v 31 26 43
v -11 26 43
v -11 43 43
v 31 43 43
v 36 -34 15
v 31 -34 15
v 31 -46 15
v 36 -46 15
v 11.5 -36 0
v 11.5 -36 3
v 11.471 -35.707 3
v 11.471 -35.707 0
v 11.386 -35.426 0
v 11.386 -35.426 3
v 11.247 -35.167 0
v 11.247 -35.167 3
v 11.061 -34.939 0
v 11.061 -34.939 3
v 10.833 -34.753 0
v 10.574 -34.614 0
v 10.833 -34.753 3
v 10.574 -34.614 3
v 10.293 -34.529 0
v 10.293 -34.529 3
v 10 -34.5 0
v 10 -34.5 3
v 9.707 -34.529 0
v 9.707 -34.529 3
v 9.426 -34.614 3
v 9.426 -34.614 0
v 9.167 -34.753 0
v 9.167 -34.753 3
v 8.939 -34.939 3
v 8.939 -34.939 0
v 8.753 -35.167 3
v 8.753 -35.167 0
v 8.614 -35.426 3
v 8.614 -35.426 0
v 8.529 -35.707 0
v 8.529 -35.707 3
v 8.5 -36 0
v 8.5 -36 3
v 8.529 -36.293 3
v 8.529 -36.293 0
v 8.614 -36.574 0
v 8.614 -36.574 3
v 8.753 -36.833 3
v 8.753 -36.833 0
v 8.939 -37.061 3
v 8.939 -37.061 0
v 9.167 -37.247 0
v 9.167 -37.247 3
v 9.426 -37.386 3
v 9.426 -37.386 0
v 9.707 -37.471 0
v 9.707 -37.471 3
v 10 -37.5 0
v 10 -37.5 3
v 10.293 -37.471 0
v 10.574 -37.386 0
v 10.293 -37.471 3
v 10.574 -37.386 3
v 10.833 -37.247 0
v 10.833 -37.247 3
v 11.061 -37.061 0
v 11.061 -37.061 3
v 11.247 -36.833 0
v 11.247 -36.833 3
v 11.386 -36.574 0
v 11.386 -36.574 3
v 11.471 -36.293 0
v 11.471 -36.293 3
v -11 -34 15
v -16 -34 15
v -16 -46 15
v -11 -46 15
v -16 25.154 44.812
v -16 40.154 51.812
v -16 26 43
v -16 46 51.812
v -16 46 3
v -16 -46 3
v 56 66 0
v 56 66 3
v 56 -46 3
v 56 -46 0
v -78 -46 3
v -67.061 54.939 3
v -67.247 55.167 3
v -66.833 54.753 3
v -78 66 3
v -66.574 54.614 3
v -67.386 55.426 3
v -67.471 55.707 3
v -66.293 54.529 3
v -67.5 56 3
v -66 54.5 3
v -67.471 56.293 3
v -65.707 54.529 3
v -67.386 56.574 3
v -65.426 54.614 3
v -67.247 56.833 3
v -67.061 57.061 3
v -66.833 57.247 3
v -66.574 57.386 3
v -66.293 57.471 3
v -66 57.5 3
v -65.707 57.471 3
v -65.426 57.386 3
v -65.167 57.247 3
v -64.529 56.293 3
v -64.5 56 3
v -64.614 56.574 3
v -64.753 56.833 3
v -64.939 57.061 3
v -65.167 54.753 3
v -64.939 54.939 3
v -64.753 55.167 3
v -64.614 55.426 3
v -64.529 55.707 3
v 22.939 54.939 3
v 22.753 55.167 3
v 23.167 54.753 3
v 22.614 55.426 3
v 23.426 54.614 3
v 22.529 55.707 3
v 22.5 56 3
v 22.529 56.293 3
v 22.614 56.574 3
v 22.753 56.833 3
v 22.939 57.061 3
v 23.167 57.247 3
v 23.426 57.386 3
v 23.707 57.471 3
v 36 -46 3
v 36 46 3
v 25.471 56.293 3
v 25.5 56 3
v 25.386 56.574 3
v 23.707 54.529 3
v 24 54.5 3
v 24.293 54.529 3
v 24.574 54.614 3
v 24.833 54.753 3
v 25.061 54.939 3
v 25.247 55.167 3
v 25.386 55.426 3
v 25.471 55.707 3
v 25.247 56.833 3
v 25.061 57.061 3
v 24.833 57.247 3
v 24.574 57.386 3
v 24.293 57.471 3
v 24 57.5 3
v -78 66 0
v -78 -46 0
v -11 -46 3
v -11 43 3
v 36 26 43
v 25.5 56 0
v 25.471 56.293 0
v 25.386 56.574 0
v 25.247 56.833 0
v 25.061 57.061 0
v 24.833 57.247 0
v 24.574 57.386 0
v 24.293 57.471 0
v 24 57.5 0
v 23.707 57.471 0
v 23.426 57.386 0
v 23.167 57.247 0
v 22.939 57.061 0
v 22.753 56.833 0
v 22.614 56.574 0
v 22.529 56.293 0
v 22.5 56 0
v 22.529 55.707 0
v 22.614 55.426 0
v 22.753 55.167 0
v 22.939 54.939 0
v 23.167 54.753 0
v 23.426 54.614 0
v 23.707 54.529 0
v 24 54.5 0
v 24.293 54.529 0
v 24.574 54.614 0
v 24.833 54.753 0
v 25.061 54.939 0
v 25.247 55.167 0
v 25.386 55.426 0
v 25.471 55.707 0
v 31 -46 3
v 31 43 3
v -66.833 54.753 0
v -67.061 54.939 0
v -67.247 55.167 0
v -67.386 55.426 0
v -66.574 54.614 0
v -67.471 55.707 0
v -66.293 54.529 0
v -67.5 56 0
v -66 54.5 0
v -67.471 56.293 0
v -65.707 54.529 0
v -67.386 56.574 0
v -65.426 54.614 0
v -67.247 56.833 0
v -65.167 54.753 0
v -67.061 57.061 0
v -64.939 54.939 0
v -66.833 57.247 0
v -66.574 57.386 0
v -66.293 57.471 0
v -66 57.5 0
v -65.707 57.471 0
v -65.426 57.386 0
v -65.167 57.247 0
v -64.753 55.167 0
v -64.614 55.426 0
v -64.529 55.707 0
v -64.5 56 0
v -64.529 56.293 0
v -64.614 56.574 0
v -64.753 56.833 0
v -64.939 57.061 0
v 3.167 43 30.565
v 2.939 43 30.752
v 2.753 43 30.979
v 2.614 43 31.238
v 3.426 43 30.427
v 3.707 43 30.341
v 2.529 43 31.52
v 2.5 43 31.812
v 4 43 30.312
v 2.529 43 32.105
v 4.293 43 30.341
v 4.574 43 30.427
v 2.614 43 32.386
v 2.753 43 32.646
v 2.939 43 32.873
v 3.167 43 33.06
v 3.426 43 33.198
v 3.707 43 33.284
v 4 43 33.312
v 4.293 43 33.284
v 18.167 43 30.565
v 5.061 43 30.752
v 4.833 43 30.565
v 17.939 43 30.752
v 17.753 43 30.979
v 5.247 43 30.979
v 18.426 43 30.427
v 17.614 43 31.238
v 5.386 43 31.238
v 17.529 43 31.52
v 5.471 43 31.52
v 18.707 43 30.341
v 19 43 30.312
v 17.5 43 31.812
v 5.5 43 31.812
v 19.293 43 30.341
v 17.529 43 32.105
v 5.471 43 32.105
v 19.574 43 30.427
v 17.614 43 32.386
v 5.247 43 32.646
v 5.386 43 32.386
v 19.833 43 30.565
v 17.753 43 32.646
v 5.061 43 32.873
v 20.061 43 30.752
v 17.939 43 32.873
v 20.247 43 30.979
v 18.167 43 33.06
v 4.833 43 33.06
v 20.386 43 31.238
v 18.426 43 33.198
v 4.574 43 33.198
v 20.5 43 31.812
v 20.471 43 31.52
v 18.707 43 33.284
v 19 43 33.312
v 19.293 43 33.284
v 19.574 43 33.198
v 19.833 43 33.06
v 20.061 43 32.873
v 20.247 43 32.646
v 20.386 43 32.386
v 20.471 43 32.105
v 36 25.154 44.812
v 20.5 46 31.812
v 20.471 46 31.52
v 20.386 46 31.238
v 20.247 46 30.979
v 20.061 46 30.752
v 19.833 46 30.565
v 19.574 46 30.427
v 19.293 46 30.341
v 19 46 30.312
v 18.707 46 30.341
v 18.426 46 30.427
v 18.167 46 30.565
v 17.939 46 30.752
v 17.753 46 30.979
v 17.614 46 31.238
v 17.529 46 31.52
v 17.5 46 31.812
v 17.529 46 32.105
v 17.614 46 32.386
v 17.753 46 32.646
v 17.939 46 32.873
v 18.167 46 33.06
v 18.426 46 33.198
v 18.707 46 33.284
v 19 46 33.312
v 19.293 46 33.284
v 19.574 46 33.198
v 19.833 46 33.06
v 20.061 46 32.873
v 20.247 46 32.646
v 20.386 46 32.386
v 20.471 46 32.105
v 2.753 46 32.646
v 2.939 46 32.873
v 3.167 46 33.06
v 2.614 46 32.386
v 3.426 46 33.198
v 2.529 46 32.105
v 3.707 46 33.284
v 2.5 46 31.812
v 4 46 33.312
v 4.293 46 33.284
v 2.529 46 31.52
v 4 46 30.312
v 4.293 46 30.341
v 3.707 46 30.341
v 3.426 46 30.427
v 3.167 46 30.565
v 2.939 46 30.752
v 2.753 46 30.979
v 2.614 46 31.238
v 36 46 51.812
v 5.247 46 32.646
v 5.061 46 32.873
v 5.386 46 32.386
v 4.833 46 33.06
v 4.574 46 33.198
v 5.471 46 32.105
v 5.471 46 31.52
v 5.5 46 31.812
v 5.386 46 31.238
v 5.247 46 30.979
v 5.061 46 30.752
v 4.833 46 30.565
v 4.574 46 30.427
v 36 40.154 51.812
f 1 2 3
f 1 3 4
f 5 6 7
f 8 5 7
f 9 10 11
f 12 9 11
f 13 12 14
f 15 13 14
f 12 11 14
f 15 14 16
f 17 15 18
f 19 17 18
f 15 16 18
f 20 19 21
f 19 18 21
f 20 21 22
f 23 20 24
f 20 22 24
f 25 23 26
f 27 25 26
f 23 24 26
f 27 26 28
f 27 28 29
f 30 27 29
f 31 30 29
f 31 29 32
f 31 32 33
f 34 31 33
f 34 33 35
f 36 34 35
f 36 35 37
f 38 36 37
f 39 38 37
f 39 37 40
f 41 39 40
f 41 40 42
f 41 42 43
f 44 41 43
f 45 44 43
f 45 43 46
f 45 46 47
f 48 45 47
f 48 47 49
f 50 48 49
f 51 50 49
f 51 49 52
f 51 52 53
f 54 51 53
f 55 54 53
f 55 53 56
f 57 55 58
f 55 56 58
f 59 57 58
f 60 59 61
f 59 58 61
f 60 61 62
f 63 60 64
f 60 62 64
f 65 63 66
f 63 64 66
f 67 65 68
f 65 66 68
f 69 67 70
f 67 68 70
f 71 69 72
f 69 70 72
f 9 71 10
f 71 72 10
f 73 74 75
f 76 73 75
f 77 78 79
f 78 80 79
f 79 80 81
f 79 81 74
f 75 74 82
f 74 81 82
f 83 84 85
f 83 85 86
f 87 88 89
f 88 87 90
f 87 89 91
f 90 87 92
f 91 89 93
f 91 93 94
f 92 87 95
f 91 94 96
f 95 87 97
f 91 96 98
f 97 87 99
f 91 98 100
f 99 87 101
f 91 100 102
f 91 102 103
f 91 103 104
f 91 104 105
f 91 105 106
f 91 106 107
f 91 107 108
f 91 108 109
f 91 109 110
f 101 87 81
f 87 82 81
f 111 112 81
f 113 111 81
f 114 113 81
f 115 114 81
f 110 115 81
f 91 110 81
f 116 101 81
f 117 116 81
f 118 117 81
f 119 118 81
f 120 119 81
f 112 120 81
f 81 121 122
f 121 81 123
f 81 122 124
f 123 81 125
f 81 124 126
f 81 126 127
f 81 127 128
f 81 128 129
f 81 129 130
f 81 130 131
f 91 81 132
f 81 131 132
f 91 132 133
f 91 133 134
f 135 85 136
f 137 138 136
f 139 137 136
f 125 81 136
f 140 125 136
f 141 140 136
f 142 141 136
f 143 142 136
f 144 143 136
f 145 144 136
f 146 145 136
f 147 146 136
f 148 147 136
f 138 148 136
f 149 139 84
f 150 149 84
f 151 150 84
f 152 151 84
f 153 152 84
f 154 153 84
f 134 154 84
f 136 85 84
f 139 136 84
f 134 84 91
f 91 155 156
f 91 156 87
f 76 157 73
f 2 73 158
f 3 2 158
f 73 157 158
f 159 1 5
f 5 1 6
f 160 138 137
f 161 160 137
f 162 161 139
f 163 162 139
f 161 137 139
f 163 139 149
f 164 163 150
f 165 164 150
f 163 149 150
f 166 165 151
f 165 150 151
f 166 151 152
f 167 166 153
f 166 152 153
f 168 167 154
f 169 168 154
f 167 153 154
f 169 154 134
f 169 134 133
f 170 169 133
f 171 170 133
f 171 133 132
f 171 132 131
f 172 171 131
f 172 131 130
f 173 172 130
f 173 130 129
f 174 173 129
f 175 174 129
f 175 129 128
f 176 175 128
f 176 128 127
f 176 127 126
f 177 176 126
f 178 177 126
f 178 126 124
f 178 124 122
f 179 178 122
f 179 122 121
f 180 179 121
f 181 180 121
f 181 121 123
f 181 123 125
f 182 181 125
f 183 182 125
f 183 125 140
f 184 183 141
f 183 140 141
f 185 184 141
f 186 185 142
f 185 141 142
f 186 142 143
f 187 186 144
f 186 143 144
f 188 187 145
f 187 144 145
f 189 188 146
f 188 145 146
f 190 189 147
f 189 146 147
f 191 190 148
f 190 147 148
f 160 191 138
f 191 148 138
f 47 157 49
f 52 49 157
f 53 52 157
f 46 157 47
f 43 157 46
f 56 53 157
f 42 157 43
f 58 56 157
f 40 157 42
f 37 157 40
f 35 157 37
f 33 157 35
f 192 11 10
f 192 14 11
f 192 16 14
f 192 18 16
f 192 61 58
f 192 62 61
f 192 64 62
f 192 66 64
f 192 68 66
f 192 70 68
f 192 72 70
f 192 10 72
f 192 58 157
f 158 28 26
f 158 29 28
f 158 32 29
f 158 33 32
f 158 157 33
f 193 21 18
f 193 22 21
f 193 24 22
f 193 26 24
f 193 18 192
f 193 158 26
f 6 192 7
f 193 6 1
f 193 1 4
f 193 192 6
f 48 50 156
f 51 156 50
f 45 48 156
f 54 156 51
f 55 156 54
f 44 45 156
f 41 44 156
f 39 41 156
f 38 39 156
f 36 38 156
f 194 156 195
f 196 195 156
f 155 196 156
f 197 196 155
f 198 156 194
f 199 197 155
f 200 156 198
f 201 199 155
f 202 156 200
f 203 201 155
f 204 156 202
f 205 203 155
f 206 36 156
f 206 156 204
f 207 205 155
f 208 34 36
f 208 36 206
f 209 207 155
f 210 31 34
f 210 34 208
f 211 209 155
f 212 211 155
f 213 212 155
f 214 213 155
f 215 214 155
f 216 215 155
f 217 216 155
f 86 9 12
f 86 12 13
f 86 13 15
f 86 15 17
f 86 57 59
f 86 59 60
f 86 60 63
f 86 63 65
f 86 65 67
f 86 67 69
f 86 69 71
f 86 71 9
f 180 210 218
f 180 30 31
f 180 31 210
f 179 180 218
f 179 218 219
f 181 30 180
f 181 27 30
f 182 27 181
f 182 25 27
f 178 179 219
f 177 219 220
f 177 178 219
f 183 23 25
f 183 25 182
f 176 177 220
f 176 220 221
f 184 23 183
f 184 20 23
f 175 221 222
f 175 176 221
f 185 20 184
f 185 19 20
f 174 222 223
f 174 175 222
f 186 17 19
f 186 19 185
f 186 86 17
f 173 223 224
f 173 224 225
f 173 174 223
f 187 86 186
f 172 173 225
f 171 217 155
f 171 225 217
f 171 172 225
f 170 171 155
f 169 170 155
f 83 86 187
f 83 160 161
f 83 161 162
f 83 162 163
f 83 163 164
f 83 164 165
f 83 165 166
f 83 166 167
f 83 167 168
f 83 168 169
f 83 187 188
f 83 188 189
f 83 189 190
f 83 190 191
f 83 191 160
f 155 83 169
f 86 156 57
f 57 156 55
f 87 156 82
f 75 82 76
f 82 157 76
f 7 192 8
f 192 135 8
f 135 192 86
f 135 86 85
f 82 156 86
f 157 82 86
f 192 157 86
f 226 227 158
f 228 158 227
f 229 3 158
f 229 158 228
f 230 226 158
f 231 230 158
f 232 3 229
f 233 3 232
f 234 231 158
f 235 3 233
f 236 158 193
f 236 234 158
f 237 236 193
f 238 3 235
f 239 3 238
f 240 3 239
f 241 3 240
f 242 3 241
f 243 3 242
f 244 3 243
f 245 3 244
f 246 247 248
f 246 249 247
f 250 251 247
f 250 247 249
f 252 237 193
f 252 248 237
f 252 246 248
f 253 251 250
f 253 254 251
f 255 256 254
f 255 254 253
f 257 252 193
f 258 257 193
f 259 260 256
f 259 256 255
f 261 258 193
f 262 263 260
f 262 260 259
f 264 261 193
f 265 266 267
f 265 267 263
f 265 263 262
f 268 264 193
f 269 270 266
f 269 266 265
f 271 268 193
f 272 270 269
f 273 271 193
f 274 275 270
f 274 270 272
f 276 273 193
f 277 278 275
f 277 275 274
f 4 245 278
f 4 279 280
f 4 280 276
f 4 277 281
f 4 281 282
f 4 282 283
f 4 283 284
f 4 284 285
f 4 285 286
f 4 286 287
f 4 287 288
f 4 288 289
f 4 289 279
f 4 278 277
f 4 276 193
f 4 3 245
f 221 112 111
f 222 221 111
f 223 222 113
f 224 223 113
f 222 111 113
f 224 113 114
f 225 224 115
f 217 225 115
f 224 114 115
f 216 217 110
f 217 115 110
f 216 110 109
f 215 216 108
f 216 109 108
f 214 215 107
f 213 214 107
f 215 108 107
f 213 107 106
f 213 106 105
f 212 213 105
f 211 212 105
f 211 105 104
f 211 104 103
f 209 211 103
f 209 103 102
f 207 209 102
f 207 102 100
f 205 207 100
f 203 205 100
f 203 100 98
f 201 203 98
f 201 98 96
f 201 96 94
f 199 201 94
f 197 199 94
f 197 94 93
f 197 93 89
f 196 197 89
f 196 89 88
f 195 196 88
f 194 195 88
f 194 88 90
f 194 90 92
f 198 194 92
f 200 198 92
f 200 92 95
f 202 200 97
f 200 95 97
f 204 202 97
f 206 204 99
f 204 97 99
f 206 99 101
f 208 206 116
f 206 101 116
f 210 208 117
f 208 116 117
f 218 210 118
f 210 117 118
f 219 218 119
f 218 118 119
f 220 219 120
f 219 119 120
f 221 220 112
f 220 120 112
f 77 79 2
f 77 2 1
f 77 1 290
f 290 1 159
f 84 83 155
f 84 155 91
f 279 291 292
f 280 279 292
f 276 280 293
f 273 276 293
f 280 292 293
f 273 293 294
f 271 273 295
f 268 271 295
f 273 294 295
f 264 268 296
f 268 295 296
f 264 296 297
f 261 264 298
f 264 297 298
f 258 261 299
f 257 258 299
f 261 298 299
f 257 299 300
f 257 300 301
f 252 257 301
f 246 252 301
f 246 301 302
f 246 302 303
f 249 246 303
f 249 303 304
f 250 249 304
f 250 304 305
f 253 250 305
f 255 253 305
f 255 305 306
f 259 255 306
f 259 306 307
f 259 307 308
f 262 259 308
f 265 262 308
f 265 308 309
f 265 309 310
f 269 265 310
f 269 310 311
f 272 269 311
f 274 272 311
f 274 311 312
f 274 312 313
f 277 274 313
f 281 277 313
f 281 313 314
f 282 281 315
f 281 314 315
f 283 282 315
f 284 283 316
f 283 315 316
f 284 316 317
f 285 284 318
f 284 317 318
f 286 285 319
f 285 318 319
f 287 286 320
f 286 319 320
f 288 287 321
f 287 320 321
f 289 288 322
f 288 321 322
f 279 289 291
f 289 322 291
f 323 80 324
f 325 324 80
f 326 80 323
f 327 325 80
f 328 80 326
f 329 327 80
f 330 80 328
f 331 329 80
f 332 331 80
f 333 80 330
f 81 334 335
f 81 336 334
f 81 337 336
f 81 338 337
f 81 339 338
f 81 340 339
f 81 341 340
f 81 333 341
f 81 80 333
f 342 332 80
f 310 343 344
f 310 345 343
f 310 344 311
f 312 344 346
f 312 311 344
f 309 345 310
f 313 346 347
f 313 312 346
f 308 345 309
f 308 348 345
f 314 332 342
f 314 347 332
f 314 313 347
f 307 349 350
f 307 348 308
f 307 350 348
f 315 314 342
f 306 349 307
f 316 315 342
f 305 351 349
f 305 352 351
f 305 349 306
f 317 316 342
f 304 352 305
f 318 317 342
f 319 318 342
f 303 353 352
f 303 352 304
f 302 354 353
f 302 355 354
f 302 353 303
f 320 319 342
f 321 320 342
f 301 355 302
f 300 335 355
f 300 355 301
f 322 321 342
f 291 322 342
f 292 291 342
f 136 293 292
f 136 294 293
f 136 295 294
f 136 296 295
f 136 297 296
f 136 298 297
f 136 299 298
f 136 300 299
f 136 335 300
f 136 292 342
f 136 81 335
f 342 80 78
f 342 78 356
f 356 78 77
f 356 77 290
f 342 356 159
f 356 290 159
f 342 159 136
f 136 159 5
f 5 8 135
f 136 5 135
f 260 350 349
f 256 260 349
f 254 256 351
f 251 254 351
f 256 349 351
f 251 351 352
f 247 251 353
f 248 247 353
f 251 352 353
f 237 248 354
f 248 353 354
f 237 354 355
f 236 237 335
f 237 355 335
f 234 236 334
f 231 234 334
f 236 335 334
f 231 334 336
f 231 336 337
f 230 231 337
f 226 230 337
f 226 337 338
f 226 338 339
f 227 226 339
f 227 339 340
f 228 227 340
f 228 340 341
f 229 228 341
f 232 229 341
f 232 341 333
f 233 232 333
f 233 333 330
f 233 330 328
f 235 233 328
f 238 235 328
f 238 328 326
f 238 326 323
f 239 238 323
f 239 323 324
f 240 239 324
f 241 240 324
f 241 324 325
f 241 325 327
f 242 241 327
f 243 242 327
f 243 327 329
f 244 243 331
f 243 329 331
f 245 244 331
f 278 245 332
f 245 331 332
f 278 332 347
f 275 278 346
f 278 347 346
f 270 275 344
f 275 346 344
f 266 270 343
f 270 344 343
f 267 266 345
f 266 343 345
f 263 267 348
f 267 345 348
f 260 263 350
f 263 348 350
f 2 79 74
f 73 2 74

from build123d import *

# Parameters (mm, degrees)
SKETCH1_W           = 72
SKETCH1_H           = 92
BOSS_EXTRUDE1_DEPTH = 3
SKETCH2_W           = 5
SKETCH2_H           = 92
BOSS_EXTRUDE2_DEPTH = 47
BOSS_EXTRUDE3_REACH = 52
SKETCH3_W           = 52
SKETCH3_H           = 20
CUT_EXTRUDE3_REACH  = 54
SKETCH8_W           = 52
SKETCH8_H           = 16.552945357
BOSS_EXTRUDE5_DEPTH = 2
SKETCH9_W           = 52
SKETCH9_H           = 5
SKETCH9_H_2         = 0.845770931
BOSS_EXTRUDE6_DEPTH = 1.812366
SKETCH10_W          = 42
SKETCH10_H          = 40
CUT_EXTRUDE4_DEPTH  = 17
CUT_EXTRUDE5_REACH  = 94
SKETCH12_R          = 1.5
SKETCH13_W          = 72
SKETCH13_H          = 3
BOSS_EXTRUDE7_DEPTH = 20
SKETCH15_W          = 3
SKETCH15_H          = 112
BOSS_EXTRUDE8_DEPTH = 20
SKETCH16_W          = 3
SKETCH16_H          = 112
BOSS_EXTRUDE9_DEPTH = 42
CUT_EXTRUDE9_REACH  = 5
SKETCH14_R          = 1.5


with BuildPart() as part:
    # Sketch1 → Boss-Extrude1 (new body)
    with BuildSketch(Plane.XY):
        Rectangle(SKETCH1_W, SKETCH1_H)
    extrude(amount=BOSS_EXTRUDE1_DEPTH)

    # Sketch2 → Boss-Extrude2 (add)
    with BuildSketch(Plane.XY.offset(3)):
        with Locations((33.5, 0)):
            Rectangle(SKETCH2_W, SKETCH2_H)
        with Locations((-13.5, 0)):
            Rectangle(SKETCH2_W, SKETCH2_H)
    extrude(amount=BOSS_EXTRUDE2_DEPTH)

    # Sketch3 → Boss-Extrude3 (add, up to next)
    with BuildSketch(Plane.XY.offset(50), mode=Mode.PRIVATE) as boss_extrude3_sk1:
        with Locations((10, 36)):
            Rectangle(SKETCH3_W, SKETCH3_H)
    boss_extrude3_tool1 = extrude(boss_extrude3_sk1.sketch, amount=-BOSS_EXTRUDE3_REACH, mode=Mode.PRIVATE) - part.part
    add(boss_extrude3_tool1.solids().sort_by_distance((10, 36, 50))[0])

    # Sketch7 → Cut-Extrude3 (cut, up to next)
    with BuildSketch(Plane.ZY.offset(16), mode=Mode.PRIVATE) as cut_extrude3_sk1:
        Polygon((50, 41), (15, -34), (15, -46), (50, -46), align=None)
    cut_extrude3_tool1 = extrude(cut_extrude3_sk1.sketch, amount=-CUT_EXTRUDE3_REACH, mode=Mode.PRIVATE) & part.part
    add(cut_extrude3_tool1.solids().sort_by_distance((-16, -16.515152, 36.919192))[0], mode=Mode.SUBTRACT)

    # Sketch8 → Boss-Extrude5 (add)
    with BuildSketch(Plane(origin=(0, -11.828467153, 25.346715328), x_dir=(1, 0, 0), z_dir=(0, -0.422885465, 0.90618314))):
        with Locations((10, 50.021309328)):
            Rectangle(SKETCH8_W, SKETCH8_H)
    extrude(amount=BOSS_EXTRUDE5_DEPTH)

    # Sketch9 → Boss-Extrude6 (add)
    with BuildSketch(Plane.XY.offset(50)):
        with Locations((10, 43.5)):
            Rectangle(SKETCH9_W, SKETCH9_H)
        with Locations((10, 40.577114534)):
            Rectangle(SKETCH9_W, SKETCH9_H_2)
    extrude(amount=BOSS_EXTRUDE6_DEPTH)

    # Sketch10 → Cut-Extrude4 (cut)
    with BuildSketch(Plane.XZ.offset(-26)):
        with Locations((10, 23)):
            Rectangle(SKETCH10_W, SKETCH10_H)
    extrude(amount=-CUT_EXTRUDE4_DEPTH, mode=Mode.SUBTRACT)

    # Sketch12 → Cut-Extrude5 (cut, up to next)
    with BuildSketch(Plane(origin=(0, 46, 0), x_dir=(1, 0, 0), z_dir=(0, 1, 0)), mode=Mode.PRIVATE) as cut_extrude5_sk1:
        with Locations((4, -31.81236628)):
            Circle(SKETCH12_R)
    cut_extrude5_tool1 = extrude(cut_extrude5_sk1.sketch, amount=-CUT_EXTRUDE5_REACH, mode=Mode.PRIVATE) & part.part
    add(cut_extrude5_tool1.solids().sort_by_distance((4, 46, 31.812366))[0], mode=Mode.SUBTRACT)
    # Sketch12 → Cut-Extrude5 (cut, up to next)
    with BuildSketch(Plane(origin=(0, 46, 0), x_dir=(1, 0, 0), z_dir=(0, 1, 0)), mode=Mode.PRIVATE) as cut_extrude5_sk2:
        with Locations((19, -31.81236628)):
            Circle(SKETCH12_R)
    cut_extrude5_tool2 = extrude(cut_extrude5_sk2.sketch, amount=-CUT_EXTRUDE5_REACH, mode=Mode.PRIVATE) & part.part
    add(cut_extrude5_tool2.solids().sort_by_distance((19, 46, 31.812366))[0], mode=Mode.SUBTRACT)

    # Sketch13 → Boss-Extrude7 (add)
    with BuildSketch(Plane(origin=(0, 46, 0), x_dir=(1, 0, 0), z_dir=(0, 1, 0))):
        with Locations((0, -1.5)):
            Rectangle(SKETCH13_W, SKETCH13_H)
    extrude(amount=BOSS_EXTRUDE7_DEPTH)

    # Sketch15 → Boss-Extrude8 (add)
    with BuildSketch(Plane(origin=(36, 0, 0), x_dir=(0, 0, -1), z_dir=(1, 0, 0))):
        with Locations((-1.5, 10)):
            Rectangle(SKETCH15_W, SKETCH15_H)
    extrude(amount=BOSS_EXTRUDE8_DEPTH)

    # Sketch16 → Boss-Extrude9 (add)
    with BuildSketch(Plane.ZY.offset(36)):
        with Locations((1.5, 10)):
            Rectangle(SKETCH16_W, SKETCH16_H)
    extrude(amount=BOSS_EXTRUDE9_DEPTH)

    # Sketch14 → Cut-Extrude9 (cut, up to next)
    with BuildSketch(Plane.XY.offset(3), mode=Mode.PRIVATE) as cut_extrude9_sk1:
        with Locations((24, 56)):
            Circle(SKETCH14_R)
    cut_extrude9_tool1 = extrude(cut_extrude9_sk1.sketch, amount=-CUT_EXTRUDE9_REACH, mode=Mode.PRIVATE) & part.part
    add(cut_extrude9_tool1.solids().sort_by_distance((24, 56, 3))[0], mode=Mode.SUBTRACT)
    # Sketch14 → Cut-Extrude9 (cut, up to next)
    with BuildSketch(Plane.XY.offset(3), mode=Mode.PRIVATE) as cut_extrude9_sk2:
        with Locations((10, -36)):
            Circle(SKETCH14_R)
    cut_extrude9_tool2 = extrude(cut_extrude9_sk2.sketch, amount=-CUT_EXTRUDE9_REACH, mode=Mode.PRIVATE) & part.part
    add(cut_extrude9_tool2.solids().sort_by_distance((10, -36, 3))[0], mode=Mode.SUBTRACT)
    # Sketch14 → Cut-Extrude9 (cut, up to next)
    with BuildSketch(Plane.XY.offset(3), mode=Mode.PRIVATE) as cut_extrude9_sk3:
        with Locations((-66, 56)):
            Circle(SKETCH14_R)
    cut_extrude9_tool3 = extrude(cut_extrude9_sk3.sketch, amount=-CUT_EXTRUDE9_REACH, mode=Mode.PRIVATE) & part.part
    add(cut_extrude9_tool3.solids().sort_by_distance((-66, 56, 3))[0], mode=Mode.SUBTRACT)


solid = part.part
